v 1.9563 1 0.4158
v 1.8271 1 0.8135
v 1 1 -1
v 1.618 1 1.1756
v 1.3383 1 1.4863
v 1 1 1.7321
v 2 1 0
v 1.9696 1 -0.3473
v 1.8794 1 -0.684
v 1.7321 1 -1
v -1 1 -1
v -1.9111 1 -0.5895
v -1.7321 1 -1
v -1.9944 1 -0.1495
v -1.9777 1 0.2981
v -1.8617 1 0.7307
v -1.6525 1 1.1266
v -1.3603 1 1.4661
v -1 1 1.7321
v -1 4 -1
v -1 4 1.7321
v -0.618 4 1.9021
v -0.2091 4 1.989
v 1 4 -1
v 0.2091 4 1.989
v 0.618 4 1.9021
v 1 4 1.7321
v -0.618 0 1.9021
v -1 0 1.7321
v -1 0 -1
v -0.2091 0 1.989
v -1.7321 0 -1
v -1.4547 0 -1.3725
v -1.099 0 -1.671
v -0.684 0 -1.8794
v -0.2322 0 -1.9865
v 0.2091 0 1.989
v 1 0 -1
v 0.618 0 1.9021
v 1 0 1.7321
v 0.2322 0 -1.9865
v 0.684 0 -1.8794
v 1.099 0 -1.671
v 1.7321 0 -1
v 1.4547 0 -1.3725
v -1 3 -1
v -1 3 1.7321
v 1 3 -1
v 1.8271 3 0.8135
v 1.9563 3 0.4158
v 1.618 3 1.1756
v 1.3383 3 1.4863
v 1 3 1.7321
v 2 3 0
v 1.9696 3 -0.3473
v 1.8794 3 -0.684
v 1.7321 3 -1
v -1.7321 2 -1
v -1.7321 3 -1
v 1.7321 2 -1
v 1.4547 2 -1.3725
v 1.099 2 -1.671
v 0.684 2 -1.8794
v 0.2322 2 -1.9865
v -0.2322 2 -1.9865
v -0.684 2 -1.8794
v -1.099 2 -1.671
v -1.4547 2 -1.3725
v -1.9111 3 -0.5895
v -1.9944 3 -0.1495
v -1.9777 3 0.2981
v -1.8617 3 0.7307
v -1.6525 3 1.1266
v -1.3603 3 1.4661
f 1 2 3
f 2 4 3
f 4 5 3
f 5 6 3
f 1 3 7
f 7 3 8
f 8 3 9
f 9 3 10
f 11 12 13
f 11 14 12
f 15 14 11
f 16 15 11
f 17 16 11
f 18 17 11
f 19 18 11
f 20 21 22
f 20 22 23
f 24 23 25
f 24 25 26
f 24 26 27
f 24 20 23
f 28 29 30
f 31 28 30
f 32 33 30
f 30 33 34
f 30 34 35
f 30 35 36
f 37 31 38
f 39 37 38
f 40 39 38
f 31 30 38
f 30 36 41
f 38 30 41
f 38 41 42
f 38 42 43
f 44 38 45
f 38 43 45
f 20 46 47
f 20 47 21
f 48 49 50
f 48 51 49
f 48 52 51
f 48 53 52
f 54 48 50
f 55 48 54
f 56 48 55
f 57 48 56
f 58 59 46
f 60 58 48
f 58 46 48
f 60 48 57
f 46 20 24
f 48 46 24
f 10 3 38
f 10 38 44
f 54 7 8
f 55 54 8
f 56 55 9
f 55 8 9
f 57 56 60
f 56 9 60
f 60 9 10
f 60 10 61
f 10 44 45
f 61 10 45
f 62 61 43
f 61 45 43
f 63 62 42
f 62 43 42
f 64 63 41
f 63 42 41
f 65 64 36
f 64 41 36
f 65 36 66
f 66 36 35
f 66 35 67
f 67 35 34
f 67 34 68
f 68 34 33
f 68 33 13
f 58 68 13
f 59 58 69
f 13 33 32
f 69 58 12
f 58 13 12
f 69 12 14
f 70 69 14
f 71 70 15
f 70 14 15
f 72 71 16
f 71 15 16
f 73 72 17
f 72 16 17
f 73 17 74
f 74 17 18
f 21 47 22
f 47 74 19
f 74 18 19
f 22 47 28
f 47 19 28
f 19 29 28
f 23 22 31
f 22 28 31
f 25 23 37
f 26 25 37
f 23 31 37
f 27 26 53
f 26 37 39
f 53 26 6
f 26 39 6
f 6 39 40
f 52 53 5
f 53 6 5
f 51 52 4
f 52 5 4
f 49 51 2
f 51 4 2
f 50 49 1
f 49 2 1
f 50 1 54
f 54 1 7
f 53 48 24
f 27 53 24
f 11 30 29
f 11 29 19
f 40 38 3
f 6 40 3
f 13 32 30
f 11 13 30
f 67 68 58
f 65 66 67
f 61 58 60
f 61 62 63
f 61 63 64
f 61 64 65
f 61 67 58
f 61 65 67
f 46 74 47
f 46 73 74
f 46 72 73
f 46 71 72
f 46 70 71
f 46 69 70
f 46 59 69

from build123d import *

# Parameters (mm, degrees)
SKETCH1_R               = 2
BOSS_EXTRUDE1_DEPTH     = 4
SKETCH2_W               = 1
SKETCH2_H               = 1
CUT_EXTRUDE1_DEPTH      = 4
CUT_EXTRUDE1_DEPTH_BACK = 1
CUT_EXTRUDE2_DEPTH      = 2


with BuildPart() as part:
    # Sketch1 → Boss-Extrude1 (new body)
    with BuildSketch(Plane(origin=(0, 0, 0), x_dir=(1, 0, 0), z_dir=(0, 1, 0))):
        Circle(SKETCH1_R)
    extrude(amount=BOSS_EXTRUDE1_DEPTH)

    # Sketch2 → Cut-Extrude1 (cut, two sides)
    with BuildSketch(Plane.XY) as cut_extrude1_sk:
        with Locations((-1.5, 0.5)):
            Rectangle(SKETCH2_W, SKETCH2_H)
        with Locations((1.5, 0.5)):
            Rectangle(SKETCH2_W, SKETCH2_H)
        with Locations((1.5, 3.5)):
            Rectangle(SKETCH2_W, SKETCH2_H)
        with Locations((-1.5, 3.5)):
            Rectangle(SKETCH2_W, SKETCH2_H)
    extrude(amount=CUT_EXTRUDE1_DEPTH, mode=Mode.SUBTRACT)
    extrude(cut_extrude1_sk.sketch, amount=-CUT_EXTRUDE1_DEPTH_BACK, mode=Mode.SUBTRACT)

    # Sketch3 → Cut-Extrude2 (cut)
    with BuildSketch(Plane(origin=(0, 4, 0), x_dir=(1, 0, 0), z_dir=(0, 1, 0))):
        with BuildLine():
            Line((-1.732050808, 1), (1.732050808, 1))
            ThreePointArc((1.732050808, 1), (0, 2), (-1.732050808, 1))
        make_face()
    extrude(amount=-CUT_EXTRUDE2_DEPTH, mode=Mode.SUBTRACT)


solid = part.part
